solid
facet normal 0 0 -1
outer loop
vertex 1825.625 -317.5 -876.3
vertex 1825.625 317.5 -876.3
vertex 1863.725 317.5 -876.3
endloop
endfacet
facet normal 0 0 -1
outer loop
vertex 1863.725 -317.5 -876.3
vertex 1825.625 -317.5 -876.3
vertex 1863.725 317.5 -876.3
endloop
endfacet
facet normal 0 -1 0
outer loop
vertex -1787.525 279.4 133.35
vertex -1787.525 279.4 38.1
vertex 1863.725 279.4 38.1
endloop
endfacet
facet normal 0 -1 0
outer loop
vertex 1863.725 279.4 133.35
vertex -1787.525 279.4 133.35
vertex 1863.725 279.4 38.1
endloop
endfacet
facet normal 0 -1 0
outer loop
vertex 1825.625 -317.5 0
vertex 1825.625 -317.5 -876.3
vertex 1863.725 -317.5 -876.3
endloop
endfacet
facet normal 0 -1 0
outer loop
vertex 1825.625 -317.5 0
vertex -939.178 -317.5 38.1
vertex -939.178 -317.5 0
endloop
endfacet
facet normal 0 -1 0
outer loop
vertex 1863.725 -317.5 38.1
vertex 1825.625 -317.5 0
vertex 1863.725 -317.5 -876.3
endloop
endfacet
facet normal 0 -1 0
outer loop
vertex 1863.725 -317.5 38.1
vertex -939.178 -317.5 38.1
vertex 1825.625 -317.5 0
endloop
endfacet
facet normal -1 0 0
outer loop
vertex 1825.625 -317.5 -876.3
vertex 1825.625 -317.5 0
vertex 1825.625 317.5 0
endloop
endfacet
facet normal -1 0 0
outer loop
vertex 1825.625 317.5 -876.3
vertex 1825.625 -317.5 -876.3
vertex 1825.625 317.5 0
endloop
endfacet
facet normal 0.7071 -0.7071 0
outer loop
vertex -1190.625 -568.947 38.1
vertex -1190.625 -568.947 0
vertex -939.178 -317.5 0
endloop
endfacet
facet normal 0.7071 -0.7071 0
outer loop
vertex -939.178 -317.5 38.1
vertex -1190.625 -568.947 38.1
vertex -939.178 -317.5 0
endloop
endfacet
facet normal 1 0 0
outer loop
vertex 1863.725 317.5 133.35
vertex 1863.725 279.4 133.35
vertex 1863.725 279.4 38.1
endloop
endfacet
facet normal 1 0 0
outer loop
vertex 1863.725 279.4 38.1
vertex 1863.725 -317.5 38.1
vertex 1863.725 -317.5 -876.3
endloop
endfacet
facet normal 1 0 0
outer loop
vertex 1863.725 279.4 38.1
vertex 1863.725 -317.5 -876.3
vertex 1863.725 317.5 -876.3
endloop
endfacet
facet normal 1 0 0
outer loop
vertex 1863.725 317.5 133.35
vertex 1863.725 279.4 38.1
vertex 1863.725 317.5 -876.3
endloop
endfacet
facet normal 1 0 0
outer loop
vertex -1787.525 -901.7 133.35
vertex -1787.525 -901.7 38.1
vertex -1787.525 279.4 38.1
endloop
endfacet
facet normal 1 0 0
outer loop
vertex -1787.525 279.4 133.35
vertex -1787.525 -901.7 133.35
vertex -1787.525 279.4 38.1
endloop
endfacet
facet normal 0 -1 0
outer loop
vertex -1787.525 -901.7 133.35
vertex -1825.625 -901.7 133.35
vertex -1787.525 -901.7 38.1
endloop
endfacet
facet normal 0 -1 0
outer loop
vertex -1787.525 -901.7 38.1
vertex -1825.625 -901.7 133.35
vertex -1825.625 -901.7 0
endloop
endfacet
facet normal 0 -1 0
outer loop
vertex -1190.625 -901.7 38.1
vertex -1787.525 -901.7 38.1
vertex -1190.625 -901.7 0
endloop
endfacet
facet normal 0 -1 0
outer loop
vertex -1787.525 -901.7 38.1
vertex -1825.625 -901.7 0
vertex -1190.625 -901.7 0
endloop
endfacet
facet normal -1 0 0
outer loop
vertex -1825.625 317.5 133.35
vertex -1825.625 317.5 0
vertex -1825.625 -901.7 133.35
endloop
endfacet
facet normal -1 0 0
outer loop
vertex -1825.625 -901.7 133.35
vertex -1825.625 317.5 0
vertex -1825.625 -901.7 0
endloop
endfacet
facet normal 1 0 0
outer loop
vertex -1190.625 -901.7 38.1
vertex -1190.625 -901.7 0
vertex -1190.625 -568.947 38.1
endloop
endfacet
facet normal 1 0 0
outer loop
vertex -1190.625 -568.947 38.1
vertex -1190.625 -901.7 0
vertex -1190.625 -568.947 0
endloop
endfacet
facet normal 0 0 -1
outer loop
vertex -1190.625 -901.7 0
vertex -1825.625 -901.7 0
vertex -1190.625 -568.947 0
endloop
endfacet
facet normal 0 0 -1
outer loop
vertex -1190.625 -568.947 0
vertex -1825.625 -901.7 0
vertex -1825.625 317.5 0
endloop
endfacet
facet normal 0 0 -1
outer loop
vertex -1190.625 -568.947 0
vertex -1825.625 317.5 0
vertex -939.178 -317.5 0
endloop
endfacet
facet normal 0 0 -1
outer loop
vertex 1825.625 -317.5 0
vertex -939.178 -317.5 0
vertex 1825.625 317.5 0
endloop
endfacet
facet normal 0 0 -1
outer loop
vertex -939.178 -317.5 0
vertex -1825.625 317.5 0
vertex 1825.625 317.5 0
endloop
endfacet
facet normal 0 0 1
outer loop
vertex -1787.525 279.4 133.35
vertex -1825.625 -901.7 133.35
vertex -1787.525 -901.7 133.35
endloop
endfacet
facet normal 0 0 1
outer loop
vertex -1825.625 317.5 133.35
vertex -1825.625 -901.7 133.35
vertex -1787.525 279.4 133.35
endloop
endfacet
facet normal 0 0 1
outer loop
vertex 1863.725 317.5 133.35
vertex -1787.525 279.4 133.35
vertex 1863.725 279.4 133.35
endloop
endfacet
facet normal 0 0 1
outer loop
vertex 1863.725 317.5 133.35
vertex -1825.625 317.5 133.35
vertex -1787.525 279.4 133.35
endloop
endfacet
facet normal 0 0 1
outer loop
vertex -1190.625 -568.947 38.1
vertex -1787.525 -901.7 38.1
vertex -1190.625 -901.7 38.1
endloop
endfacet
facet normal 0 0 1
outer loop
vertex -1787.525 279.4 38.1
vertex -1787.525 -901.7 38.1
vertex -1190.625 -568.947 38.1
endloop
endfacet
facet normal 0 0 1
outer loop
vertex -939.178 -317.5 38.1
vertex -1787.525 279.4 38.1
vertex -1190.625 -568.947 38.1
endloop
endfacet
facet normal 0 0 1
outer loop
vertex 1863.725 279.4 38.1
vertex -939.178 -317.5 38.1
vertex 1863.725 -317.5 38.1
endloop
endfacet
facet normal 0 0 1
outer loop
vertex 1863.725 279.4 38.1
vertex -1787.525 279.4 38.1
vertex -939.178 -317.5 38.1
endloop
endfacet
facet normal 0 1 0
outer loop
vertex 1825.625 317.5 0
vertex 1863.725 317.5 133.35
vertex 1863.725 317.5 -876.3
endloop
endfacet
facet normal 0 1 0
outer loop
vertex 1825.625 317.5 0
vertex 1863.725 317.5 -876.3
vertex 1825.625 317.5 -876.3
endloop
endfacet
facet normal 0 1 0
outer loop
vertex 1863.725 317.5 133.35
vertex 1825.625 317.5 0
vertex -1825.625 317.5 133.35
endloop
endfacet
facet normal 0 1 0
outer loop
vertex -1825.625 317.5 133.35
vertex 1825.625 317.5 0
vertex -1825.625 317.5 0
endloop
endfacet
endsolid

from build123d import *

# Parameters (mm, degrees)
F0_W     = 38.1
F0_H     = 635
F1_DEPTH = 38.1
F2_DEPTH = 876.3
F4_DEPTH = 95.25


with BuildPart() as f1:
    # F0 (on Top) → F1 (new body)
    with BuildSketch(Plane.XY):
        Polygon((1825.625, -317.5), (1825.625, 317.5), (-1825.625, 317.5), (-1825.625, -317.5), (-1190.625, -317.5), (-939.177829, -317.5), align=None)
        Polygon((-1190.625, -317.5), (-1825.625, -317.5), (-1825.625, -901.7), (-1190.625, -901.7), (-1190.625, -568.947171), align=None)
        with Locations((1844.675, 0)):
            Rectangle(F0_W, F0_H)
        Polygon((-1190.625, -568.947171), (-939.177829, -317.5), (-1190.625, -317.5), align=None)
    extrude(amount=F1_DEPTH)

    # F0 (on Top) → F2 (join)
    with BuildSketch(Plane.XY):
        with Locations((1844.675, 0)):
            Rectangle(F0_W, F0_H)
    extrude(amount=-F2_DEPTH)

    # F3 (on face) → F4 (join)
    with BuildSketch(Plane.XY.offset(38.1)):
        Polygon((-1825.625, 279.4), (-1825.625, -901.7), (-1787.525, -901.7), (-1787.525, 279.4), (1863.725, 279.4), (1863.725, 317.5), (-1787.525, 317.5), (-1825.625, 317.5), align=None)
    extrude(amount=F4_DEPTH)


solid = f1.part
